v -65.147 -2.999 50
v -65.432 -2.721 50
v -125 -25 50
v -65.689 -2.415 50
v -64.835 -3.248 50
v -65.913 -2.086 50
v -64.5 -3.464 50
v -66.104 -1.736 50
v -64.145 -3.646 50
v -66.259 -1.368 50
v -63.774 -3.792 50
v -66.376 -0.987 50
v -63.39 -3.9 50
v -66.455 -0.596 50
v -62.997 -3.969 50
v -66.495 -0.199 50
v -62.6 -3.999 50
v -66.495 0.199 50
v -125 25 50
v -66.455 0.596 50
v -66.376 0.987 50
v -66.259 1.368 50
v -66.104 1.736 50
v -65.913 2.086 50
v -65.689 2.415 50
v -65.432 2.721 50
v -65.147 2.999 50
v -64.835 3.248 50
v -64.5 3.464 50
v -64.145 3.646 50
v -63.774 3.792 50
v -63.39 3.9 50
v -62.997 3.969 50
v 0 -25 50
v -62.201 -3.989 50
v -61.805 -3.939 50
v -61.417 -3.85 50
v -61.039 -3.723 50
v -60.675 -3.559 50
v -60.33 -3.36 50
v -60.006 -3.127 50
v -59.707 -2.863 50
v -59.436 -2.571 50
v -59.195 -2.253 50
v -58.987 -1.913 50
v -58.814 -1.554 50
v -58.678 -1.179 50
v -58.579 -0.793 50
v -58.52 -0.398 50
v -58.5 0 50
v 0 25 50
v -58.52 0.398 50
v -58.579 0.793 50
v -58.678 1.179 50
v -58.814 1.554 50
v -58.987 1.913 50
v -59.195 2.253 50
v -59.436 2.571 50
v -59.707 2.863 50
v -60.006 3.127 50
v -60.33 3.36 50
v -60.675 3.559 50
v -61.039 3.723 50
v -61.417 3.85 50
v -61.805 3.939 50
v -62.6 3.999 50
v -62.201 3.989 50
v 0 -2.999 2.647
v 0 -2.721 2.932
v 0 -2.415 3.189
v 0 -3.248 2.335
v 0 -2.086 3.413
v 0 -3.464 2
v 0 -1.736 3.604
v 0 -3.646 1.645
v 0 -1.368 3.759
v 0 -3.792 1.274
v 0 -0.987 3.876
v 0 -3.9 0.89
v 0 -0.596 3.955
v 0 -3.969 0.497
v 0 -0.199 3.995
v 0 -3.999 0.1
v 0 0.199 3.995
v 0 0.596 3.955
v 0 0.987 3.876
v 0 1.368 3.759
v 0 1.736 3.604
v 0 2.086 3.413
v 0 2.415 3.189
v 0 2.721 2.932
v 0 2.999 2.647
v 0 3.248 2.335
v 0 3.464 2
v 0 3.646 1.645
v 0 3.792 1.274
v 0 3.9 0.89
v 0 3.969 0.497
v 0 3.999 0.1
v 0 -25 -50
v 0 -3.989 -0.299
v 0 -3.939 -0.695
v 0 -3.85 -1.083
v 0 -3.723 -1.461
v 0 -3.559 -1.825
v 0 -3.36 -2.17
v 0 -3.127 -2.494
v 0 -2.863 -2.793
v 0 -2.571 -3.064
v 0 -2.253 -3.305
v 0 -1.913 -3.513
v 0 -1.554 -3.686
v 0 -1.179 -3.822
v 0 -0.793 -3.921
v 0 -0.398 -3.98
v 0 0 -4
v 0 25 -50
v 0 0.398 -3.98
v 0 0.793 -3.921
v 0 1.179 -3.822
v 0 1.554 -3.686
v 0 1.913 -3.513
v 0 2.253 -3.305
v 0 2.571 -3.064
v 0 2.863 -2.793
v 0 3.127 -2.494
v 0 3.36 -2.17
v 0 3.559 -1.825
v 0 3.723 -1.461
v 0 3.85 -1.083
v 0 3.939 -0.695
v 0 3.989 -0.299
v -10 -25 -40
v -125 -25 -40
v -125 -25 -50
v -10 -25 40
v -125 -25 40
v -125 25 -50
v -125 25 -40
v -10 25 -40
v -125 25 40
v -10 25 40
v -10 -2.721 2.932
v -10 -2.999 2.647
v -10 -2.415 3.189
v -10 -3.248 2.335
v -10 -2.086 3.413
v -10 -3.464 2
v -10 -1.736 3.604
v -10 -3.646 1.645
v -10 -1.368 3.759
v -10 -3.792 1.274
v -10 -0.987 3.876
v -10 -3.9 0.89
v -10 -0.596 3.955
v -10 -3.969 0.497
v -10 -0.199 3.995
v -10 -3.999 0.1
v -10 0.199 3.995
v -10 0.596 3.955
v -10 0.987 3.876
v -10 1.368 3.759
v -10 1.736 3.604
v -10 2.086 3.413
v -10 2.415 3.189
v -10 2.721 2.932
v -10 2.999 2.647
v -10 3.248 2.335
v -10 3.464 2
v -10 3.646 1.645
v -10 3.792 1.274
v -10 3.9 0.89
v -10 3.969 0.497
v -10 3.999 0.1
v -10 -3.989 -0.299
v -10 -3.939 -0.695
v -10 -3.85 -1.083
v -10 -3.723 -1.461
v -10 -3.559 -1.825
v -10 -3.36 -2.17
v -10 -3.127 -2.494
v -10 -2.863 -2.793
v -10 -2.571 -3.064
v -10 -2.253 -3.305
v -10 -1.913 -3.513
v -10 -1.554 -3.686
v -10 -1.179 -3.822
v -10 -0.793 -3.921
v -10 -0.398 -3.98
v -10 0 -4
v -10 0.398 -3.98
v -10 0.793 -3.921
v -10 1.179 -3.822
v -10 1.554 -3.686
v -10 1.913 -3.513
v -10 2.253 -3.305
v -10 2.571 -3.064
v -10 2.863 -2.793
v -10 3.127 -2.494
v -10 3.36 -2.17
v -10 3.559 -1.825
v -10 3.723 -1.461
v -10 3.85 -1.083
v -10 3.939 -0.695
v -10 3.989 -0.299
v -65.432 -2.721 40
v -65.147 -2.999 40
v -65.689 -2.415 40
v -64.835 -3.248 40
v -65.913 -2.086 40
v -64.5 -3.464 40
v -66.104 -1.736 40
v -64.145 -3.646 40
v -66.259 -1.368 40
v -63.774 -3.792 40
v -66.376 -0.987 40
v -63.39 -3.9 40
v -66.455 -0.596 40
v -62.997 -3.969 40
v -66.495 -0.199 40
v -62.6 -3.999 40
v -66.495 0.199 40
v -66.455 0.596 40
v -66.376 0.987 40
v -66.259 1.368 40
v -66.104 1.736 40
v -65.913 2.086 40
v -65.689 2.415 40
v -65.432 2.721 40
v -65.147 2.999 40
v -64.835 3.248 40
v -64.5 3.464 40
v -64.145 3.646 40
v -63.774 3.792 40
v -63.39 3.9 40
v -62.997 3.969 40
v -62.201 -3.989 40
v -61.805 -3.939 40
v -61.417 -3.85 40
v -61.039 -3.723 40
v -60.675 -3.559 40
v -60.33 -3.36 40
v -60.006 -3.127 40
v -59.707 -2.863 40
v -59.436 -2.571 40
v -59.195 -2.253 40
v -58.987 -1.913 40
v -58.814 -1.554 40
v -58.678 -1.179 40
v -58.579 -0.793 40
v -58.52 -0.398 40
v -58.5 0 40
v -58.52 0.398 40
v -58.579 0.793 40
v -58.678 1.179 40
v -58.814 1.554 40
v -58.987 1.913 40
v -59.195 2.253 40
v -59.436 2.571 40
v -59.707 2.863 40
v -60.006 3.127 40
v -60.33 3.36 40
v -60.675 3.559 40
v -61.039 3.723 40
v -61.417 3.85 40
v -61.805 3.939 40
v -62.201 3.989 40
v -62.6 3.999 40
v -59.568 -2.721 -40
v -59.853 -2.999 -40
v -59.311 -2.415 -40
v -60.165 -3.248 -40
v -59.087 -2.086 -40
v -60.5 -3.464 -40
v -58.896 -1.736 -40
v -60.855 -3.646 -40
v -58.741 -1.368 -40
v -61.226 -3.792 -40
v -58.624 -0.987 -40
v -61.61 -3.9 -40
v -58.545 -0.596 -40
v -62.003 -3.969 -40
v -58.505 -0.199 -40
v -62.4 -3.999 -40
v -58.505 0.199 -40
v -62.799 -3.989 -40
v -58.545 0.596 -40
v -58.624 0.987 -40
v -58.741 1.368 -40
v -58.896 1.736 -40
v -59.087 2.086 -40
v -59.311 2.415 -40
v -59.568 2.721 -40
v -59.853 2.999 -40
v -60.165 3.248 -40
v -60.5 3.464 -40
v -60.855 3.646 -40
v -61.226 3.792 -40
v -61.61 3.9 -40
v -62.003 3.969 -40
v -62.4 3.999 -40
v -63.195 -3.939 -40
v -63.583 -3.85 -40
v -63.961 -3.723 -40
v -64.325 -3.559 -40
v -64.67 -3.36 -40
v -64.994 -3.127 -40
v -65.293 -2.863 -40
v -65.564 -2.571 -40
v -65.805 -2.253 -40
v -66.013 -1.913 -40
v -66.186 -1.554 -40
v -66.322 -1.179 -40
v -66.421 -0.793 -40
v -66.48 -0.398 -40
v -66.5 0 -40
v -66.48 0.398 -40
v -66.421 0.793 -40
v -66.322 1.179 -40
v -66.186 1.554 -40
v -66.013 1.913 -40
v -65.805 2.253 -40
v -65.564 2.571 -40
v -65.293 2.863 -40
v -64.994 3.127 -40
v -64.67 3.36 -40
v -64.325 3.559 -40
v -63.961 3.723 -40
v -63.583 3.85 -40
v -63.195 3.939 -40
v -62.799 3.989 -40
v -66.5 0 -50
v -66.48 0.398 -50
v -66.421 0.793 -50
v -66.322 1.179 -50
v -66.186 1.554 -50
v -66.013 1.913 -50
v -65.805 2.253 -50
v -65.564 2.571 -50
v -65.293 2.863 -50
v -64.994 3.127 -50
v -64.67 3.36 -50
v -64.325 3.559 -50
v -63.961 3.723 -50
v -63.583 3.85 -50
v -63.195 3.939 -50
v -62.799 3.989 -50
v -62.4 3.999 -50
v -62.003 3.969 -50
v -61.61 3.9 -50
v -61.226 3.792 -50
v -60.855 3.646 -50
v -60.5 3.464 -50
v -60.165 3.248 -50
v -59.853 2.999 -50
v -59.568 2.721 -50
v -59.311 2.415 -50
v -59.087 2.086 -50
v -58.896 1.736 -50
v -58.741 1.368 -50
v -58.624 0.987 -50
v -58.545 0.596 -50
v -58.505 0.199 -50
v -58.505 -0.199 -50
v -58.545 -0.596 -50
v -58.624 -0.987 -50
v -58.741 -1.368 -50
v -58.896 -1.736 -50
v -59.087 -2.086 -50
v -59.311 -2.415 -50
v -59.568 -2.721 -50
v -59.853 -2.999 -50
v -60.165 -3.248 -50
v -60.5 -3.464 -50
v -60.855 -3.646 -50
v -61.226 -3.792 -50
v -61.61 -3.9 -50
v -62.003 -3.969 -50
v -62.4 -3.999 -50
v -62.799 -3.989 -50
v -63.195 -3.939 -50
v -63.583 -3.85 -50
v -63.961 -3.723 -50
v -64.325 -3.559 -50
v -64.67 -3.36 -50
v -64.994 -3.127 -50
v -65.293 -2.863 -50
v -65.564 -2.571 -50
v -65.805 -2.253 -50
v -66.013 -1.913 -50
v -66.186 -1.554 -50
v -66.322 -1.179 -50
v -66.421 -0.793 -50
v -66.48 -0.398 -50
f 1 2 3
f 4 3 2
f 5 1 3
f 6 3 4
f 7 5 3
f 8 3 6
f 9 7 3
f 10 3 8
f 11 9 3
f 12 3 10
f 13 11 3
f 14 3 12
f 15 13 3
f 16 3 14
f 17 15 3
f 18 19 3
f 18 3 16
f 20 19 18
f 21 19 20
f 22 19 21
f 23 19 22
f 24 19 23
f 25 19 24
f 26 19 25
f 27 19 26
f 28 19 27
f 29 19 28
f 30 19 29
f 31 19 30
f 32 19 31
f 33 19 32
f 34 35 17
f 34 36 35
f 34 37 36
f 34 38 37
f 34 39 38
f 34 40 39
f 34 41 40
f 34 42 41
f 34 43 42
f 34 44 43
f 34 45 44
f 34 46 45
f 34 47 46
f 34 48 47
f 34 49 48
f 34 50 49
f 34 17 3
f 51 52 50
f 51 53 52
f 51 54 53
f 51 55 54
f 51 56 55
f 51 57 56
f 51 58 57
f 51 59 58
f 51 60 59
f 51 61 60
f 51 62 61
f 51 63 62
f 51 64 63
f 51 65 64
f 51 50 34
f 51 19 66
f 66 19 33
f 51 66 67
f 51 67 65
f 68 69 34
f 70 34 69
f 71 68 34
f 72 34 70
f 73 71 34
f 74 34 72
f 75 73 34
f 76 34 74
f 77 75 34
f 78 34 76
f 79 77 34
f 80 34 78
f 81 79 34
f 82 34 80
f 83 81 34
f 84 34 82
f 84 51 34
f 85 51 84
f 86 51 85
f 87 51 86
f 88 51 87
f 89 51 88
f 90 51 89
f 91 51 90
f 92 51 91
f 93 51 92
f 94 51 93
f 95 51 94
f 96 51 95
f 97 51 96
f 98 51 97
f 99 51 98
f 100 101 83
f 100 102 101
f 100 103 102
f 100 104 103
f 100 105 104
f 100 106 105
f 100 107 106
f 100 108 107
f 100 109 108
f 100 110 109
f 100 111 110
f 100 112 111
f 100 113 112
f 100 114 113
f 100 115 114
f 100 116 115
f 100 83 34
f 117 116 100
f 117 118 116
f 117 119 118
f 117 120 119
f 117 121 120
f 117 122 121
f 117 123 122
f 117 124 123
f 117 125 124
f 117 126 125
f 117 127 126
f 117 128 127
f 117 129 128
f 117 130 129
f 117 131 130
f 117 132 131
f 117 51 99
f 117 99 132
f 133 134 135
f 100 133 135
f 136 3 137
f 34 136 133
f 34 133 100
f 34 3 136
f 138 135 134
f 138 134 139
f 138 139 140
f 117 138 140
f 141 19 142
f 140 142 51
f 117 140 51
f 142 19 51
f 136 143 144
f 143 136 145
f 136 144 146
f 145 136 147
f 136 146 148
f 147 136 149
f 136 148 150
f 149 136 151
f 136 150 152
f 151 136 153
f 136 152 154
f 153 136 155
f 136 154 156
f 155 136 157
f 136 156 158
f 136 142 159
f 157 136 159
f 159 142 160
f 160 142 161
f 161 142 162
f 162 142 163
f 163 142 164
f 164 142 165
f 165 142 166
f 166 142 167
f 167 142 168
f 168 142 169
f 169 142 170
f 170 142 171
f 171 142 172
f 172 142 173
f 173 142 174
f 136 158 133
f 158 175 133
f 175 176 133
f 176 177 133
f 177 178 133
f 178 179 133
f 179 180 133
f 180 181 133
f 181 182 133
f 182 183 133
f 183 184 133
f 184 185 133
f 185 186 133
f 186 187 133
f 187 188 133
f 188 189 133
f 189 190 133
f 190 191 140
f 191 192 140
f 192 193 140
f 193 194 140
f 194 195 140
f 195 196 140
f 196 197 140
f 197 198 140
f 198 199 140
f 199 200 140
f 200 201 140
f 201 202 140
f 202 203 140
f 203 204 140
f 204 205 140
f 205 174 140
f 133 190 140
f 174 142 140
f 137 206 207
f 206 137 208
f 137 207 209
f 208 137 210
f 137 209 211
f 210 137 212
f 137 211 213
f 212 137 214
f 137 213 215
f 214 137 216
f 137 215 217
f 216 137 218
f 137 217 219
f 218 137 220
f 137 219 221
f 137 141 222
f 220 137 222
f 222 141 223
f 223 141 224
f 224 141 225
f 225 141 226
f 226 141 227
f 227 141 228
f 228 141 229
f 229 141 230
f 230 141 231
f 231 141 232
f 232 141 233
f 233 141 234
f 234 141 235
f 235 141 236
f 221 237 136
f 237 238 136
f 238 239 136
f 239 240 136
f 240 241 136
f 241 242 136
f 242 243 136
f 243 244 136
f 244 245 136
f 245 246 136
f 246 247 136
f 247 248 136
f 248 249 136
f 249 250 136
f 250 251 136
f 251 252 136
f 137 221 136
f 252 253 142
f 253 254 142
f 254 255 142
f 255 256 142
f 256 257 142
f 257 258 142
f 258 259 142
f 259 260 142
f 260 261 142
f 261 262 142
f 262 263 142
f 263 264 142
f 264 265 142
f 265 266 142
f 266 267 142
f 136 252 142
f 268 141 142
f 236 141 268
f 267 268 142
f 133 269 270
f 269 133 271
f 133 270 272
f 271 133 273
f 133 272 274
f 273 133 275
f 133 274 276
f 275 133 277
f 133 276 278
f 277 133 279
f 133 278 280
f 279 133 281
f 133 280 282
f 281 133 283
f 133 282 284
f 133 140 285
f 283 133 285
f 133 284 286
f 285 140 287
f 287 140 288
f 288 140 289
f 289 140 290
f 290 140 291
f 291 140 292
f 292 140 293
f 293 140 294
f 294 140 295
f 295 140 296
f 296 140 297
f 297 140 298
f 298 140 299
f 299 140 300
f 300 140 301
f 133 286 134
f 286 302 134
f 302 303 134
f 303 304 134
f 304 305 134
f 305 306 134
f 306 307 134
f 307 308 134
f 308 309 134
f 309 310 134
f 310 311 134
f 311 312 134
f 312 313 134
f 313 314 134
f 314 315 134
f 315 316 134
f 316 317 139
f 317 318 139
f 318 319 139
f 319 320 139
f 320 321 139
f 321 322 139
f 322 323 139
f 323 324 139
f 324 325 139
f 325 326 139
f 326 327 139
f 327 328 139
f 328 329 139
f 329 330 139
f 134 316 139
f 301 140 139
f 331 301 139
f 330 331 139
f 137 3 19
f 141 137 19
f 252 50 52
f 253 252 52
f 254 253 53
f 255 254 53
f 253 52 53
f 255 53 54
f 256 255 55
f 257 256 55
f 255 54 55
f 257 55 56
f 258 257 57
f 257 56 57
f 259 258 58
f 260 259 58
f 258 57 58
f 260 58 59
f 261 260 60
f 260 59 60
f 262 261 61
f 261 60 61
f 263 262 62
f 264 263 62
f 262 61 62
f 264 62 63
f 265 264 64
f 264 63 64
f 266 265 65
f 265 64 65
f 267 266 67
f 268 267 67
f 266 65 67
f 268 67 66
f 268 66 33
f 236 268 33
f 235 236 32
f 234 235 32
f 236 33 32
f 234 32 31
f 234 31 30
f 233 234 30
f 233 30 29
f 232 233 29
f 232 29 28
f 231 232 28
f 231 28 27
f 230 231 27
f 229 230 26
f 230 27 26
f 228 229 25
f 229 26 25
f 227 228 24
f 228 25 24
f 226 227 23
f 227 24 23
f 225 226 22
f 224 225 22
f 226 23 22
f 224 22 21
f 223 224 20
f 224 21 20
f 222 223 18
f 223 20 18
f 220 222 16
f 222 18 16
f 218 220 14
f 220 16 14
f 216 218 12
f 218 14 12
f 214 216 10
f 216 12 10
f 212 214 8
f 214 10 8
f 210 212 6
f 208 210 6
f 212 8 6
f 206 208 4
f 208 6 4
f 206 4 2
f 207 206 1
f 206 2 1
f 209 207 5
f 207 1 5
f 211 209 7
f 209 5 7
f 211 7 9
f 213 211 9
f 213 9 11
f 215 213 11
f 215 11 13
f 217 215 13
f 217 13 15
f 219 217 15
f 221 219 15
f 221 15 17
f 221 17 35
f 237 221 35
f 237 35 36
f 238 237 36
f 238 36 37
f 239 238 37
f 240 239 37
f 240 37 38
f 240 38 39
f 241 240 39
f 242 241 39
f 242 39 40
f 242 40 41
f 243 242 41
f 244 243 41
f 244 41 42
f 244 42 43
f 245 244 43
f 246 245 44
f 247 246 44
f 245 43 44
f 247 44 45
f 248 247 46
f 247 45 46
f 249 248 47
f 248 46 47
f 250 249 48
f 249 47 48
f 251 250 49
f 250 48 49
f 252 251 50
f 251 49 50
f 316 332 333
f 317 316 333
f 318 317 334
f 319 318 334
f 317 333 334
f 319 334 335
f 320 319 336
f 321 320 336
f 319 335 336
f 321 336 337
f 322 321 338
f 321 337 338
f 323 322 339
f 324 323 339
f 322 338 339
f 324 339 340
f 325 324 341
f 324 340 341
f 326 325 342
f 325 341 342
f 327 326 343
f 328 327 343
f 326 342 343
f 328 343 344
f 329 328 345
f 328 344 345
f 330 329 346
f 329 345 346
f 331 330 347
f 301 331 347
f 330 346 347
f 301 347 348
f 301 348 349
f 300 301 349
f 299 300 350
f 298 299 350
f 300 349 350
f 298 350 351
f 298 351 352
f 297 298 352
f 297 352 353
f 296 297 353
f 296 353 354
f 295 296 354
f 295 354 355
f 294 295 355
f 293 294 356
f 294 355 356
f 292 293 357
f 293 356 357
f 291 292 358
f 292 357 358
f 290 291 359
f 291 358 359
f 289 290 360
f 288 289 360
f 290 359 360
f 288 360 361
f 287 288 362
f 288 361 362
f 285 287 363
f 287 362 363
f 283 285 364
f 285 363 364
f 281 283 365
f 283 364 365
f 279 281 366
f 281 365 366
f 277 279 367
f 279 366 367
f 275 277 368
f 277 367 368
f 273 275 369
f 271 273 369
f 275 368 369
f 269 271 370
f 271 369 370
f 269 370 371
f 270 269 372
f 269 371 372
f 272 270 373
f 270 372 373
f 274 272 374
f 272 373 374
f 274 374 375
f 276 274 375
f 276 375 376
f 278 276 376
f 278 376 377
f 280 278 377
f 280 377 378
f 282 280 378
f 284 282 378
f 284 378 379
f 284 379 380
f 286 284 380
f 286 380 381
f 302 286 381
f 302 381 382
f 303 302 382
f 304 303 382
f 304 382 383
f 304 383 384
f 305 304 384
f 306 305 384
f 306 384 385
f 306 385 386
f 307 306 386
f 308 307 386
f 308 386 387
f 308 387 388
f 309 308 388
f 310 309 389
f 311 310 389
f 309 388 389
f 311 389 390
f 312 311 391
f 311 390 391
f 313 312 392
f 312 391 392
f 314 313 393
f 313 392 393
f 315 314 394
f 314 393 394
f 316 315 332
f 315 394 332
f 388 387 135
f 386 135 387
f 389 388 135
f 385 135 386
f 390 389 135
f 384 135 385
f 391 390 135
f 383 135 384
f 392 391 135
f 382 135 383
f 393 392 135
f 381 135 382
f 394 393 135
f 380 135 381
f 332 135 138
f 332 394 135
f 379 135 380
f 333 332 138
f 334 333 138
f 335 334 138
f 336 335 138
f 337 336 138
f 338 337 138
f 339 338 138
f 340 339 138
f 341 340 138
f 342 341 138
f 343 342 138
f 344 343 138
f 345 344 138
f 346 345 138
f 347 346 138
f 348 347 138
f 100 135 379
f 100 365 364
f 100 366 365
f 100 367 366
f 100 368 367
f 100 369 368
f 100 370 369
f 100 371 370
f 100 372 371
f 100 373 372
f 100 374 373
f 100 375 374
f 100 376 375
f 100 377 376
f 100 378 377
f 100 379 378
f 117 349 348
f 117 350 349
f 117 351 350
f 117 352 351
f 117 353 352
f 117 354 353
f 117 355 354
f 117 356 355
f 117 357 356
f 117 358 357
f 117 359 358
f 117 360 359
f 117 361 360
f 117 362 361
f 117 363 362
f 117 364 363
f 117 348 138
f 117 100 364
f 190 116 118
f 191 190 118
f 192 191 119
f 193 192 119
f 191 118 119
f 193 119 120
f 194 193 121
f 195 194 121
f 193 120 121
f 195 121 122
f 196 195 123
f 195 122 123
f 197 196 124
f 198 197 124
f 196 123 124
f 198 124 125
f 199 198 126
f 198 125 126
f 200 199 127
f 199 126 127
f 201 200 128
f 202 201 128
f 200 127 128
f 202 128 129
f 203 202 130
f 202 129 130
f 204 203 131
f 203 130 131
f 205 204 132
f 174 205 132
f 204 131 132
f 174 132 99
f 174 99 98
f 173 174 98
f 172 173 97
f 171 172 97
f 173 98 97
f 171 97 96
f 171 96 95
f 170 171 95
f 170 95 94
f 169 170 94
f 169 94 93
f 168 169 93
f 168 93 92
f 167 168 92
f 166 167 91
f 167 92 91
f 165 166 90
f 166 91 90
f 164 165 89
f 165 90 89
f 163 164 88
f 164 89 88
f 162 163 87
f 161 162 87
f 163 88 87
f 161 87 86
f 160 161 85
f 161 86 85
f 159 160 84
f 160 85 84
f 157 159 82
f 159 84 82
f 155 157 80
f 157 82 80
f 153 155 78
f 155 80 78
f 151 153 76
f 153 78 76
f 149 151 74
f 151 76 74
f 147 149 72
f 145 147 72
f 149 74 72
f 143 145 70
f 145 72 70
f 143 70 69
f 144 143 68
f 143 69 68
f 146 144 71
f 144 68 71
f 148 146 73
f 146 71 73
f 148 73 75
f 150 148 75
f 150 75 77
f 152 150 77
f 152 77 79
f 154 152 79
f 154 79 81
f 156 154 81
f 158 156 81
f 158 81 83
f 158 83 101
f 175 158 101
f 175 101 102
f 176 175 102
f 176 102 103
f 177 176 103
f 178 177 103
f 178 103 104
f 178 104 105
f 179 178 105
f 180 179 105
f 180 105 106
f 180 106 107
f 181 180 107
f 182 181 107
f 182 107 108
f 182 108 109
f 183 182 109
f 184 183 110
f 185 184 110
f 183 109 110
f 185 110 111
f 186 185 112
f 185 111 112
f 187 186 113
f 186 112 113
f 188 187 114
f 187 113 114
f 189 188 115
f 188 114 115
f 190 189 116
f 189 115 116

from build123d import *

# Parameters (mm, degrees)
SKETCH5_W           = 100
SKETCH5_H           = 50
SKETCH5_R           = 4
BOSS_EXTRUDE6_DEPTH = 10
SKETCH6_W           = 125
SKETCH6_H           = 50
SKETCH6_R           = 4
BOSS_EXTRUDE7_DEPTH = 10
SKETCH7_W           = 125
SKETCH7_H           = 50
SKETCH7_R           = 4
BOSS_EXTRUDE8_DEPTH = 10


with BuildPart() as part:
    # Sketch5 → Boss-Extrude6 (new body)
    with BuildSketch(Plane(origin=(0, 0, 0), x_dir=(0, 0, -1), z_dir=(1, 0, 0))):
        Rectangle(SKETCH5_W, SKETCH5_H)
        Circle(SKETCH5_R, mode=Mode.SUBTRACT)
    extrude(amount=-BOSS_EXTRUDE6_DEPTH)

    # Sketch6 → Boss-Extrude7 (add)
    with BuildSketch(Plane(origin=(0, 0, -50), x_dir=(-1, 0, 0), z_dir=(0, 0, -1))):
        with Locations((62.5, 0)):
            Rectangle(SKETCH6_W, SKETCH6_H)
        with Locations((62.5, 0)):
            Circle(SKETCH6_R, mode=Mode.SUBTRACT)
    extrude(amount=-BOSS_EXTRUDE7_DEPTH)

    # Sketch7 → Boss-Extrude8 (add)
    with BuildSketch(Plane.XY.offset(50)):
        with Locations((-62.5, 0)):
            Rectangle(SKETCH7_W, SKETCH7_H)
        with Locations((-62.5, 0)):
            Circle(SKETCH7_R, mode=Mode.SUBTRACT)
    extrude(amount=-BOSS_EXTRUDE8_DEPTH)


solid = part.part
